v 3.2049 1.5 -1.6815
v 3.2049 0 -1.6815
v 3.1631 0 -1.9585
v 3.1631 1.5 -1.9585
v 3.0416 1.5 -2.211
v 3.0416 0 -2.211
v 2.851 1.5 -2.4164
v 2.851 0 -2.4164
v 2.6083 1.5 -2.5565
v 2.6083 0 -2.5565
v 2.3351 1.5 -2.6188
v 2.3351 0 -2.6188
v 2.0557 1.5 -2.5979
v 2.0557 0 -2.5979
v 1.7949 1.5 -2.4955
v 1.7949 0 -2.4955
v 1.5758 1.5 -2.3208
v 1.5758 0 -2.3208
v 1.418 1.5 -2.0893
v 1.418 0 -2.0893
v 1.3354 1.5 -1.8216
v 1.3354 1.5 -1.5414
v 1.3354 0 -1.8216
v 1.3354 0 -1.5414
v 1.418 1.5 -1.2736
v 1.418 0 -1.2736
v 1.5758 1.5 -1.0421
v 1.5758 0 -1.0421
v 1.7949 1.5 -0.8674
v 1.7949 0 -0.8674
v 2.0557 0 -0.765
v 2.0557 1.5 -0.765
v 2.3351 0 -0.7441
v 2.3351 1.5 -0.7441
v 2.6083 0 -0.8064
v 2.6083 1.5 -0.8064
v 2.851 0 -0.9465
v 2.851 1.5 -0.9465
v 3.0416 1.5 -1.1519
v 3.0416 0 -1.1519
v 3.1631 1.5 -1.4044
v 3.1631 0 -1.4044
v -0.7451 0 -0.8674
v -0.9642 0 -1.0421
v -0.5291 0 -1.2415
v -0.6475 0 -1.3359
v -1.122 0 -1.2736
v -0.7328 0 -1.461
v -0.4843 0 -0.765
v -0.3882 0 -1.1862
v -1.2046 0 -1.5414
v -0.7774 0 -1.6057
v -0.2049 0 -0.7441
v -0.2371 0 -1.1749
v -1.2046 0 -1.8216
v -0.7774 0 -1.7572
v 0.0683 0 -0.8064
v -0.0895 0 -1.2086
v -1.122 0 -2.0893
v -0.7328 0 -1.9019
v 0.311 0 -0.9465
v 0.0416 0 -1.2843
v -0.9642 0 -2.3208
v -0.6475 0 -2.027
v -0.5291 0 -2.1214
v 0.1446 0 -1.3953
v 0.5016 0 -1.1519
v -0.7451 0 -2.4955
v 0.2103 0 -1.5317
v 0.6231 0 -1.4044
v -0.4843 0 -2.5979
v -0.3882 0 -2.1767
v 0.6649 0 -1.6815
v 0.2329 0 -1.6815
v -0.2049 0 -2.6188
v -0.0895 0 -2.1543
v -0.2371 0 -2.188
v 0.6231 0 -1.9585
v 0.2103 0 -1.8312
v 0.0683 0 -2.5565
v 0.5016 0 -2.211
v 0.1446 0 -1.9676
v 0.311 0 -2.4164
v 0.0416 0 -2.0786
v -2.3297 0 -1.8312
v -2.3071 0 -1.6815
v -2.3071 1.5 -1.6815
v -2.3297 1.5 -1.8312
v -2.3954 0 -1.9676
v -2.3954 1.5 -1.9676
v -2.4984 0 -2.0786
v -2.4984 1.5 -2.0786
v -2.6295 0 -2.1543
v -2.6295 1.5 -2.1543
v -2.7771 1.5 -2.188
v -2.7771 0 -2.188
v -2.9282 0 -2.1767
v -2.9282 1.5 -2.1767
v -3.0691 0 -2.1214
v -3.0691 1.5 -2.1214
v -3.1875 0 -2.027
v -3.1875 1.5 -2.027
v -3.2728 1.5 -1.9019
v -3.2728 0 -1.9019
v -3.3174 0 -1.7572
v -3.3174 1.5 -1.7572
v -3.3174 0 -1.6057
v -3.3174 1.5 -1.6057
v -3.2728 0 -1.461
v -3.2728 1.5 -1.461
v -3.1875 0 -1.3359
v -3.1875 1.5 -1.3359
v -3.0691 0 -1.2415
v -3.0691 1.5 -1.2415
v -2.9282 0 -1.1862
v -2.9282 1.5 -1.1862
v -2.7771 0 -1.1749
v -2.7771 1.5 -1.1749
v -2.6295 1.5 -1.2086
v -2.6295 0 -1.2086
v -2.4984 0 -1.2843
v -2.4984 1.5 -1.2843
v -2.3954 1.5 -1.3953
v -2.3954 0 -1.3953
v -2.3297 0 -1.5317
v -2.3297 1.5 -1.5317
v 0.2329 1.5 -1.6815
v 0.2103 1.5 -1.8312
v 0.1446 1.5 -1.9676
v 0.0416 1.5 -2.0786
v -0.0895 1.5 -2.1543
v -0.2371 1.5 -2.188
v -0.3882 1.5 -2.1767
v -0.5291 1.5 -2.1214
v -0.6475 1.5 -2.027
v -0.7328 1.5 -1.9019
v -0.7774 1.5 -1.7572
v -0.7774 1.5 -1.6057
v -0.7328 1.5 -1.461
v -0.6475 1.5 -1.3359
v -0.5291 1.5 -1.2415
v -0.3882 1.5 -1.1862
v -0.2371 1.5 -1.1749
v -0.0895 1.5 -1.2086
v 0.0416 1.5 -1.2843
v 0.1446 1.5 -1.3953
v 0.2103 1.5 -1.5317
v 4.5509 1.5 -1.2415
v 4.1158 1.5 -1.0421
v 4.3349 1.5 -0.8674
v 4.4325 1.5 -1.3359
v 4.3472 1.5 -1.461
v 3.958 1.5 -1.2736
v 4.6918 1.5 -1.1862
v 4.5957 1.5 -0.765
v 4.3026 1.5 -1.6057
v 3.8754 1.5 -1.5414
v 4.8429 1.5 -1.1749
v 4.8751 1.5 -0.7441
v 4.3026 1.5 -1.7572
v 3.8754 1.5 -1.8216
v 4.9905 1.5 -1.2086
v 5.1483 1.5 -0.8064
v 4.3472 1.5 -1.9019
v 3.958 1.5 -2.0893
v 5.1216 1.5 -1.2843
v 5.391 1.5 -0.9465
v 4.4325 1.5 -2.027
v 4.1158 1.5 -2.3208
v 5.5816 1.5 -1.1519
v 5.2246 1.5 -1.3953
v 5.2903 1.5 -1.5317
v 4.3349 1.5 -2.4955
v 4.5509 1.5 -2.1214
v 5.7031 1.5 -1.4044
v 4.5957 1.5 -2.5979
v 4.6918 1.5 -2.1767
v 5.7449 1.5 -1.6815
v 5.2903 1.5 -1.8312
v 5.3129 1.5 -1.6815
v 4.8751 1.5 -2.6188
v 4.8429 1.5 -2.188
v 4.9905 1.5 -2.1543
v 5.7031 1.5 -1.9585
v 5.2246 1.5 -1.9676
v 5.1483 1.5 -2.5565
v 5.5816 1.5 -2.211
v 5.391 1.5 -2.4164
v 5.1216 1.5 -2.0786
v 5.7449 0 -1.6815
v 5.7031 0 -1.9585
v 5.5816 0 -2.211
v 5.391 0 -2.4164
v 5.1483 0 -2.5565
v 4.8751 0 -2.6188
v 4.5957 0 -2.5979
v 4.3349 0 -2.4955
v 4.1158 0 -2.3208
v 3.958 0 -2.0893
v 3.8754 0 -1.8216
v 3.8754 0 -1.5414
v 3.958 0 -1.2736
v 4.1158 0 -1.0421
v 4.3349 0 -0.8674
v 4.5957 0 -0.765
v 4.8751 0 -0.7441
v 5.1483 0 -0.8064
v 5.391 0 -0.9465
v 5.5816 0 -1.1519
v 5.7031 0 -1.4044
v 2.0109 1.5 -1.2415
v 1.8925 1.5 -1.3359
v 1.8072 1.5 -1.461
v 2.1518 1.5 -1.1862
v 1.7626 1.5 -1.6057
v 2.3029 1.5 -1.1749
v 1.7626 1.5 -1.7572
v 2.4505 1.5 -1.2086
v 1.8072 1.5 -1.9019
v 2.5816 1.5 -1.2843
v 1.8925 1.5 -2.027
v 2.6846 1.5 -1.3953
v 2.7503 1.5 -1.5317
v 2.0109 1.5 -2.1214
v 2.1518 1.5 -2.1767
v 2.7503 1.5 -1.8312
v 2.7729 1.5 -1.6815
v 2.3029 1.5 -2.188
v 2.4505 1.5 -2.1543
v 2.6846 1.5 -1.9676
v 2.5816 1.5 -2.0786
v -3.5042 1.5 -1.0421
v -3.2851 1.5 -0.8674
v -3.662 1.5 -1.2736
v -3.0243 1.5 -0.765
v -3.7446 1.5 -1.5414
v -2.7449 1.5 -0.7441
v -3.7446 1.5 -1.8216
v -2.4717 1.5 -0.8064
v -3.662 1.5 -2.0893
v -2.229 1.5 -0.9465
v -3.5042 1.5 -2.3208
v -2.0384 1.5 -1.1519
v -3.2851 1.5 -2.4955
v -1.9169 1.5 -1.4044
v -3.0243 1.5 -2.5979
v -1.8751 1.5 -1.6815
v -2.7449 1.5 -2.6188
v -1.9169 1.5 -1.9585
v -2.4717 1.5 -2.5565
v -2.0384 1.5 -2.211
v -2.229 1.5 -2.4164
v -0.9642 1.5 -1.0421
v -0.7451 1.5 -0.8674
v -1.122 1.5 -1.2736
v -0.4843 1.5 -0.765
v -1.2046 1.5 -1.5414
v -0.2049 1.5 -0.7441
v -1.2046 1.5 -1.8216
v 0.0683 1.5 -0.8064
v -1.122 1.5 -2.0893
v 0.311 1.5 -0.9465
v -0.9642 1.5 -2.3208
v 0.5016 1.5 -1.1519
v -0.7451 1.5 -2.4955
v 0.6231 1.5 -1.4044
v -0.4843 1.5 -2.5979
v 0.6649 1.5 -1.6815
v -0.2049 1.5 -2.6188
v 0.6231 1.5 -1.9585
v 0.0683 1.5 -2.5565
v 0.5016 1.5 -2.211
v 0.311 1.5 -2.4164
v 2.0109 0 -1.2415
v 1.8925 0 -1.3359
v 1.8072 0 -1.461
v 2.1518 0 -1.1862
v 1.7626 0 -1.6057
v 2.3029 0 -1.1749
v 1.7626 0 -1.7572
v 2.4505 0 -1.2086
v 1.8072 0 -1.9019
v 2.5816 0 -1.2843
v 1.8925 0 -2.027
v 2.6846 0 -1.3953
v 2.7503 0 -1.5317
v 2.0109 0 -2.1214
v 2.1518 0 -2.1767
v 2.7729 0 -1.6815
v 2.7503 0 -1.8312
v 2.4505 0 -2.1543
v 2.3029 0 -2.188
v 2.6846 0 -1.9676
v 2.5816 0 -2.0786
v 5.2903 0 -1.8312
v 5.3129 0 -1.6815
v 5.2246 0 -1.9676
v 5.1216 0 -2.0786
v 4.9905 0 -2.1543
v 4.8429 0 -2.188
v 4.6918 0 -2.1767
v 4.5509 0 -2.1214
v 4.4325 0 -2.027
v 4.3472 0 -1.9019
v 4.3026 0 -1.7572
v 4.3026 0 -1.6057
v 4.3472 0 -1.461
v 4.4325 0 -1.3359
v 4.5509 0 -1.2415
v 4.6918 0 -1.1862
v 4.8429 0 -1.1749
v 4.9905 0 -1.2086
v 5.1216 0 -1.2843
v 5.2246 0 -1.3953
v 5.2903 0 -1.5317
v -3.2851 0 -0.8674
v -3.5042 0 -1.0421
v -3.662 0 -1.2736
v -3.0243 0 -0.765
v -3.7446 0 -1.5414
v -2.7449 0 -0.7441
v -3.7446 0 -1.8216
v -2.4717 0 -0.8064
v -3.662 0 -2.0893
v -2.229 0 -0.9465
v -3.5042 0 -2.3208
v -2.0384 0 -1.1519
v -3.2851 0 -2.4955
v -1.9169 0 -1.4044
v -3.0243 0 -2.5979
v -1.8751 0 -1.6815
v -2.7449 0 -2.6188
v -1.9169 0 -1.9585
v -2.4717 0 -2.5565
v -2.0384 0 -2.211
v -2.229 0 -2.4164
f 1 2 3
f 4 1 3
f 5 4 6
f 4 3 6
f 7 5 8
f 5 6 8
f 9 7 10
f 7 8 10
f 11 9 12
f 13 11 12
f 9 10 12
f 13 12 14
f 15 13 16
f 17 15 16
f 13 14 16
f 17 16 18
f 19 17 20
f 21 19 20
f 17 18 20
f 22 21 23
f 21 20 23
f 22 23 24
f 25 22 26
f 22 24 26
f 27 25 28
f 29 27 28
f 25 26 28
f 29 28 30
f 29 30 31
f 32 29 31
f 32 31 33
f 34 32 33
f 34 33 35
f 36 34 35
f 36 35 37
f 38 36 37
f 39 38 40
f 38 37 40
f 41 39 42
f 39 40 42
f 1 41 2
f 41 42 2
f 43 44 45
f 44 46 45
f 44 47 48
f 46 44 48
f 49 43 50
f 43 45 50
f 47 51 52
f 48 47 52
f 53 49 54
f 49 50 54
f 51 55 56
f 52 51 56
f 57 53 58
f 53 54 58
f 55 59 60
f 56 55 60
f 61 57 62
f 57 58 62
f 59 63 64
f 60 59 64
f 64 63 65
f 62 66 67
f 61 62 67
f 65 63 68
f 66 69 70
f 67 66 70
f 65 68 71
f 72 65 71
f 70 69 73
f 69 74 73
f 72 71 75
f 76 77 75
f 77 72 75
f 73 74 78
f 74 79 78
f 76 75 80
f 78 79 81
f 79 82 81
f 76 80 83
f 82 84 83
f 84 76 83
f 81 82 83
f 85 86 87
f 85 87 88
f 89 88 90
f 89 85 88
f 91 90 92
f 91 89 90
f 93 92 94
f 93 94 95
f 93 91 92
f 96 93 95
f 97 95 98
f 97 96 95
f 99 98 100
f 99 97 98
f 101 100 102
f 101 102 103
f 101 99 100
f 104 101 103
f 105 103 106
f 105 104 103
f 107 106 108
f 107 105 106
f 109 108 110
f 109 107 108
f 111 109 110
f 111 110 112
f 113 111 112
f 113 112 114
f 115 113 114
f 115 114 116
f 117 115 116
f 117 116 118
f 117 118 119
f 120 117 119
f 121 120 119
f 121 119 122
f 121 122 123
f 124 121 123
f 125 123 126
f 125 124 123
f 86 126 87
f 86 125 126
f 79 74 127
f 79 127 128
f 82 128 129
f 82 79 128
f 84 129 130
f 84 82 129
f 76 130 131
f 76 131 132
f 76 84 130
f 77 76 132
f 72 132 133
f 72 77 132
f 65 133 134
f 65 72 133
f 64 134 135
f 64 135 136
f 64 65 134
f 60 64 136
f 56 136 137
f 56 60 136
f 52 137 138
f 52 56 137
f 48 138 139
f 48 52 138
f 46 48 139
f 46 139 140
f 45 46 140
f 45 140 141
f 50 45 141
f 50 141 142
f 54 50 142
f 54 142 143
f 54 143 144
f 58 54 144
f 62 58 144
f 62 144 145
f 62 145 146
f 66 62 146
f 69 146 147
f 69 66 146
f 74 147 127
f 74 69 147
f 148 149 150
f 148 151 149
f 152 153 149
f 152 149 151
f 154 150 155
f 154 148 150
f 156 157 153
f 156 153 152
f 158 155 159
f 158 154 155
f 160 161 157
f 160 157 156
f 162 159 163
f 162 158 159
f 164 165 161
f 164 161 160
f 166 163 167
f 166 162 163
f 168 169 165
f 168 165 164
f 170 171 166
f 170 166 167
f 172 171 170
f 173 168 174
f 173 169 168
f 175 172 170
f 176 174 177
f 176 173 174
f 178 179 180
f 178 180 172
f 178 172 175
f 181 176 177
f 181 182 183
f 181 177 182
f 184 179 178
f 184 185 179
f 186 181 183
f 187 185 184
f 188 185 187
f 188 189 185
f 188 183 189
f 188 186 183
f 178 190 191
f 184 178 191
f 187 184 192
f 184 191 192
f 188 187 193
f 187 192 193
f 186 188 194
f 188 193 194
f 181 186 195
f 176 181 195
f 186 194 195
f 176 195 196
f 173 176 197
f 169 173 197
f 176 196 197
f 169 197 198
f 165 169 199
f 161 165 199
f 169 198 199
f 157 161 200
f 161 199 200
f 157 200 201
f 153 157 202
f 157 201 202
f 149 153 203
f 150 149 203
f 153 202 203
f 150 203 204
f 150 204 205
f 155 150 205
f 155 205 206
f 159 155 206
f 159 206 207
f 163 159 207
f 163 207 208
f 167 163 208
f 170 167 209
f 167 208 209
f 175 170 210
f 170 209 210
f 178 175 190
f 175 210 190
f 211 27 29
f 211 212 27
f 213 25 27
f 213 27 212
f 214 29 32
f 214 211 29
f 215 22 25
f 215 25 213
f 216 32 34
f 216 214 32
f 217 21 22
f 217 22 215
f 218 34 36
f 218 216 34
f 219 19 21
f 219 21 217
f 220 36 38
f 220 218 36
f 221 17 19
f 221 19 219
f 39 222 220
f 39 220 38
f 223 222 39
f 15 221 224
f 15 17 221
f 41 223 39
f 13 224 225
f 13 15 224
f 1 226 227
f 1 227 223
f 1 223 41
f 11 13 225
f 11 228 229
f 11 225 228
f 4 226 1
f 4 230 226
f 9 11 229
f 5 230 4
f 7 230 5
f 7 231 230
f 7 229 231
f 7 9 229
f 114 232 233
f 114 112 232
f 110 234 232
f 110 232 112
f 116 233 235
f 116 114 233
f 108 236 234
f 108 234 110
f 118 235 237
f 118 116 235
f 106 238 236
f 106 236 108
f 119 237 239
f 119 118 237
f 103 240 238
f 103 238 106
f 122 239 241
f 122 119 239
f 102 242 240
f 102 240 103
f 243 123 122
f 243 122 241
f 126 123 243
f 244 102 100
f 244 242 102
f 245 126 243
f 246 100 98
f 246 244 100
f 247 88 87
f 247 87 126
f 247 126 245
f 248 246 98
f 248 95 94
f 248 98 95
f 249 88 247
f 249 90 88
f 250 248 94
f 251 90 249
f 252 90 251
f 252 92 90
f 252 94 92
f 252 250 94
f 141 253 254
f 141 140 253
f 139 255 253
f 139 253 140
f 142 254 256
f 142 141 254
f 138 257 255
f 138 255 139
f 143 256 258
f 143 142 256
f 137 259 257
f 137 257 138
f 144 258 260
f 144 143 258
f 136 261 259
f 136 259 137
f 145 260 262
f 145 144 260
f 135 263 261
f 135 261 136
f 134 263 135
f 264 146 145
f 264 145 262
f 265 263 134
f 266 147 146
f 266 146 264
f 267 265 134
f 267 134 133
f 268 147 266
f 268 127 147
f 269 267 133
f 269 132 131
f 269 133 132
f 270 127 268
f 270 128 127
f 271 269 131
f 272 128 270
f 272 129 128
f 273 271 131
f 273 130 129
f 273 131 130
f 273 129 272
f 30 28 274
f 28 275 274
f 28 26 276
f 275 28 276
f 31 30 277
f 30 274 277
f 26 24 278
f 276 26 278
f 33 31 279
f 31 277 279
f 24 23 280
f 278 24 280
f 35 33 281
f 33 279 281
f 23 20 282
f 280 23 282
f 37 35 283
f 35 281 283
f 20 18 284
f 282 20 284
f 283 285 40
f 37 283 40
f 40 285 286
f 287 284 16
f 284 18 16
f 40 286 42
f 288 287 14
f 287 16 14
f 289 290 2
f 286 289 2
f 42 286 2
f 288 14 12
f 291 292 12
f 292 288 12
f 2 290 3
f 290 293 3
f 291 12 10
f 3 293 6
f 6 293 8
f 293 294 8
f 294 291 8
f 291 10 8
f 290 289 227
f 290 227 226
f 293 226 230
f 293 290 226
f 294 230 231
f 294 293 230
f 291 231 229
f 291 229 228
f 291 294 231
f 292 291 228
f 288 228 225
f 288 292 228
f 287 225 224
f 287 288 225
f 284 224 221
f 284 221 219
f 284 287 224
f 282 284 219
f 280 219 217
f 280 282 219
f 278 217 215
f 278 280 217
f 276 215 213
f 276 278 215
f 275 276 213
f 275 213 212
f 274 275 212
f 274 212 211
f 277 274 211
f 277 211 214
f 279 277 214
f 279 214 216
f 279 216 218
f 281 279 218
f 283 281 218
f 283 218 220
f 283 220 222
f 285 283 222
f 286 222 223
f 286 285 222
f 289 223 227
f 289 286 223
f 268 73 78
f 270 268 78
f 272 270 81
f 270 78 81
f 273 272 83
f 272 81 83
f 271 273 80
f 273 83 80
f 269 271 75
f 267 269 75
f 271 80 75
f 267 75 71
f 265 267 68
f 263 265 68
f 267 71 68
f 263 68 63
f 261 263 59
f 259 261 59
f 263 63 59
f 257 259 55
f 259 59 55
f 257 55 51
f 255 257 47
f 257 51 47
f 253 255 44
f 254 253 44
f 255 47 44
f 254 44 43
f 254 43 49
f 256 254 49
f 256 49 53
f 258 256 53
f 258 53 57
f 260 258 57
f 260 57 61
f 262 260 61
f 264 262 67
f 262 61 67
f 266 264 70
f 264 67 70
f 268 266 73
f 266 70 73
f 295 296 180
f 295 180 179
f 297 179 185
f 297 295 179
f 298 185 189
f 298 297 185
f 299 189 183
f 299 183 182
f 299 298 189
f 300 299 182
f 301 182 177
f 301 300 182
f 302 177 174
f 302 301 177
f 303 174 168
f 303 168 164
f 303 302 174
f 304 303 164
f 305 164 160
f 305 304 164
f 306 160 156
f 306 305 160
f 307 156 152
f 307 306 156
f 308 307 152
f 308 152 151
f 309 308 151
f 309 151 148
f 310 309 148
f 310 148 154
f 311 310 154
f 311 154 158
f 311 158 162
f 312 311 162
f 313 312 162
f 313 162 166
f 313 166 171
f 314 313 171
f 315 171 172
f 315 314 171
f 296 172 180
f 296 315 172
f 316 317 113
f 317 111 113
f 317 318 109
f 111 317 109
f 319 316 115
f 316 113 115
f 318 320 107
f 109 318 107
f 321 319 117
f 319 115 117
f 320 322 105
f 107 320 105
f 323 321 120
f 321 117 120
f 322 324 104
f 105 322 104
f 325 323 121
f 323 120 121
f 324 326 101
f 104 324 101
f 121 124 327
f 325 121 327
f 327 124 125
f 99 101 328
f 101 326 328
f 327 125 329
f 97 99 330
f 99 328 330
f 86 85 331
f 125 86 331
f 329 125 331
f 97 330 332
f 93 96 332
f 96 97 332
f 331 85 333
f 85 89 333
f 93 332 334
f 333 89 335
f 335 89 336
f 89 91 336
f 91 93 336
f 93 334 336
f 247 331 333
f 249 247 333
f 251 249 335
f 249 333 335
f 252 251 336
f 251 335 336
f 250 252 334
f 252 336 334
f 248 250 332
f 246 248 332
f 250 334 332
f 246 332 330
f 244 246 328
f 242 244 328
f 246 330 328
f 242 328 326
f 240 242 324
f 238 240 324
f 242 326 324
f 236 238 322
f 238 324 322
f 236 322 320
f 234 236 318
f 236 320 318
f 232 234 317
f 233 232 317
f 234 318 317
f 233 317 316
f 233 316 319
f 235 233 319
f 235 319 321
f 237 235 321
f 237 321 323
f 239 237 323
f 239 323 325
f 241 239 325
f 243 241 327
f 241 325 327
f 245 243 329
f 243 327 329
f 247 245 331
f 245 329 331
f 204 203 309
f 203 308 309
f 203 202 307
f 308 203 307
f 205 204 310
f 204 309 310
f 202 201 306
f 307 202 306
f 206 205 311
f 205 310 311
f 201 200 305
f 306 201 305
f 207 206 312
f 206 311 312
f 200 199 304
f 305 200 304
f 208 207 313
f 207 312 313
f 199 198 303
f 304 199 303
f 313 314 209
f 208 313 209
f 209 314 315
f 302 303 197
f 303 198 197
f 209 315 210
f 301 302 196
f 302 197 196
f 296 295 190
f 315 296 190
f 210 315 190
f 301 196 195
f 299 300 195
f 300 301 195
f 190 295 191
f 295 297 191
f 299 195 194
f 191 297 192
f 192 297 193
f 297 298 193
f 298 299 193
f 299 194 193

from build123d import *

# Parameters (mm, degrees)
SKETCH1_R             = 0.94
SKETCH1_R_2           = 0.508
BOSS_EXTRUDE1_DEPTH   = 1.5
BOSS_EXTRUDE1_2_DEPTH = 1.5
BOSS_EXTRUDE1_3_DEPTH = 1.5
BOSS_EXTRUDE1_4_DEPTH = 1.5


with BuildPart() as part:
    # Sketch1 → Boss-Extrude1 (new body)
    with BuildSketch(Plane(origin=(0, 0, 0), x_dir=(1, 0, 0), z_dir=(0, 1, 0))):
        with Locations((-2.815110191, 1.681457709)):
            Circle(SKETCH1_R)
        with Locations((-2.815110191, 1.681457709)):
            Circle(SKETCH1_R_2, mode=Mode.SUBTRACT)
    extrude(amount=BOSS_EXTRUDE1_DEPTH)


with BuildPart() as body_2:
    # Sketch1 → Boss-Extrude1 2 (new body)
    with BuildSketch(Plane(origin=(0, 0, 0), x_dir=(1, 0, 0), z_dir=(0, 1, 0))):
        with Locations((-0.275110191, 1.681457709)):
            Circle(SKETCH1_R)
        with Locations((-0.275110191, 1.681457709)):
            Circle(SKETCH1_R_2, mode=Mode.SUBTRACT)
    extrude(amount=BOSS_EXTRUDE1_2_DEPTH)


with BuildPart() as body_3:
    # Sketch1 → Boss-Extrude1 3 (new body)
    with BuildSketch(Plane(origin=(0, 0, 0), x_dir=(1, 0, 0), z_dir=(0, 1, 0))):
        with Locations((2.264889809, 1.681457709)):
            Circle(SKETCH1_R)
        with Locations((2.264889809, 1.681457709)):
            Circle(SKETCH1_R_2, mode=Mode.SUBTRACT)
    extrude(amount=BOSS_EXTRUDE1_3_DEPTH)


with BuildPart() as body_4:
    # Sketch1 → Boss-Extrude1 4 (new body)
    with BuildSketch(Plane(origin=(0, 0, 0), x_dir=(1, 0, 0), z_dir=(0, 1, 0))):
        with Locations((4.804889809, 1.681457709)):
            Circle(SKETCH1_R)
        with Locations((4.804889809, 1.681457709)):
            Circle(SKETCH1_R_2, mode=Mode.SUBTRACT)
    extrude(amount=BOSS_EXTRUDE1_4_DEPTH)


solid = Compound([part.part, body_2.part, body_3.part, body_4.part])
